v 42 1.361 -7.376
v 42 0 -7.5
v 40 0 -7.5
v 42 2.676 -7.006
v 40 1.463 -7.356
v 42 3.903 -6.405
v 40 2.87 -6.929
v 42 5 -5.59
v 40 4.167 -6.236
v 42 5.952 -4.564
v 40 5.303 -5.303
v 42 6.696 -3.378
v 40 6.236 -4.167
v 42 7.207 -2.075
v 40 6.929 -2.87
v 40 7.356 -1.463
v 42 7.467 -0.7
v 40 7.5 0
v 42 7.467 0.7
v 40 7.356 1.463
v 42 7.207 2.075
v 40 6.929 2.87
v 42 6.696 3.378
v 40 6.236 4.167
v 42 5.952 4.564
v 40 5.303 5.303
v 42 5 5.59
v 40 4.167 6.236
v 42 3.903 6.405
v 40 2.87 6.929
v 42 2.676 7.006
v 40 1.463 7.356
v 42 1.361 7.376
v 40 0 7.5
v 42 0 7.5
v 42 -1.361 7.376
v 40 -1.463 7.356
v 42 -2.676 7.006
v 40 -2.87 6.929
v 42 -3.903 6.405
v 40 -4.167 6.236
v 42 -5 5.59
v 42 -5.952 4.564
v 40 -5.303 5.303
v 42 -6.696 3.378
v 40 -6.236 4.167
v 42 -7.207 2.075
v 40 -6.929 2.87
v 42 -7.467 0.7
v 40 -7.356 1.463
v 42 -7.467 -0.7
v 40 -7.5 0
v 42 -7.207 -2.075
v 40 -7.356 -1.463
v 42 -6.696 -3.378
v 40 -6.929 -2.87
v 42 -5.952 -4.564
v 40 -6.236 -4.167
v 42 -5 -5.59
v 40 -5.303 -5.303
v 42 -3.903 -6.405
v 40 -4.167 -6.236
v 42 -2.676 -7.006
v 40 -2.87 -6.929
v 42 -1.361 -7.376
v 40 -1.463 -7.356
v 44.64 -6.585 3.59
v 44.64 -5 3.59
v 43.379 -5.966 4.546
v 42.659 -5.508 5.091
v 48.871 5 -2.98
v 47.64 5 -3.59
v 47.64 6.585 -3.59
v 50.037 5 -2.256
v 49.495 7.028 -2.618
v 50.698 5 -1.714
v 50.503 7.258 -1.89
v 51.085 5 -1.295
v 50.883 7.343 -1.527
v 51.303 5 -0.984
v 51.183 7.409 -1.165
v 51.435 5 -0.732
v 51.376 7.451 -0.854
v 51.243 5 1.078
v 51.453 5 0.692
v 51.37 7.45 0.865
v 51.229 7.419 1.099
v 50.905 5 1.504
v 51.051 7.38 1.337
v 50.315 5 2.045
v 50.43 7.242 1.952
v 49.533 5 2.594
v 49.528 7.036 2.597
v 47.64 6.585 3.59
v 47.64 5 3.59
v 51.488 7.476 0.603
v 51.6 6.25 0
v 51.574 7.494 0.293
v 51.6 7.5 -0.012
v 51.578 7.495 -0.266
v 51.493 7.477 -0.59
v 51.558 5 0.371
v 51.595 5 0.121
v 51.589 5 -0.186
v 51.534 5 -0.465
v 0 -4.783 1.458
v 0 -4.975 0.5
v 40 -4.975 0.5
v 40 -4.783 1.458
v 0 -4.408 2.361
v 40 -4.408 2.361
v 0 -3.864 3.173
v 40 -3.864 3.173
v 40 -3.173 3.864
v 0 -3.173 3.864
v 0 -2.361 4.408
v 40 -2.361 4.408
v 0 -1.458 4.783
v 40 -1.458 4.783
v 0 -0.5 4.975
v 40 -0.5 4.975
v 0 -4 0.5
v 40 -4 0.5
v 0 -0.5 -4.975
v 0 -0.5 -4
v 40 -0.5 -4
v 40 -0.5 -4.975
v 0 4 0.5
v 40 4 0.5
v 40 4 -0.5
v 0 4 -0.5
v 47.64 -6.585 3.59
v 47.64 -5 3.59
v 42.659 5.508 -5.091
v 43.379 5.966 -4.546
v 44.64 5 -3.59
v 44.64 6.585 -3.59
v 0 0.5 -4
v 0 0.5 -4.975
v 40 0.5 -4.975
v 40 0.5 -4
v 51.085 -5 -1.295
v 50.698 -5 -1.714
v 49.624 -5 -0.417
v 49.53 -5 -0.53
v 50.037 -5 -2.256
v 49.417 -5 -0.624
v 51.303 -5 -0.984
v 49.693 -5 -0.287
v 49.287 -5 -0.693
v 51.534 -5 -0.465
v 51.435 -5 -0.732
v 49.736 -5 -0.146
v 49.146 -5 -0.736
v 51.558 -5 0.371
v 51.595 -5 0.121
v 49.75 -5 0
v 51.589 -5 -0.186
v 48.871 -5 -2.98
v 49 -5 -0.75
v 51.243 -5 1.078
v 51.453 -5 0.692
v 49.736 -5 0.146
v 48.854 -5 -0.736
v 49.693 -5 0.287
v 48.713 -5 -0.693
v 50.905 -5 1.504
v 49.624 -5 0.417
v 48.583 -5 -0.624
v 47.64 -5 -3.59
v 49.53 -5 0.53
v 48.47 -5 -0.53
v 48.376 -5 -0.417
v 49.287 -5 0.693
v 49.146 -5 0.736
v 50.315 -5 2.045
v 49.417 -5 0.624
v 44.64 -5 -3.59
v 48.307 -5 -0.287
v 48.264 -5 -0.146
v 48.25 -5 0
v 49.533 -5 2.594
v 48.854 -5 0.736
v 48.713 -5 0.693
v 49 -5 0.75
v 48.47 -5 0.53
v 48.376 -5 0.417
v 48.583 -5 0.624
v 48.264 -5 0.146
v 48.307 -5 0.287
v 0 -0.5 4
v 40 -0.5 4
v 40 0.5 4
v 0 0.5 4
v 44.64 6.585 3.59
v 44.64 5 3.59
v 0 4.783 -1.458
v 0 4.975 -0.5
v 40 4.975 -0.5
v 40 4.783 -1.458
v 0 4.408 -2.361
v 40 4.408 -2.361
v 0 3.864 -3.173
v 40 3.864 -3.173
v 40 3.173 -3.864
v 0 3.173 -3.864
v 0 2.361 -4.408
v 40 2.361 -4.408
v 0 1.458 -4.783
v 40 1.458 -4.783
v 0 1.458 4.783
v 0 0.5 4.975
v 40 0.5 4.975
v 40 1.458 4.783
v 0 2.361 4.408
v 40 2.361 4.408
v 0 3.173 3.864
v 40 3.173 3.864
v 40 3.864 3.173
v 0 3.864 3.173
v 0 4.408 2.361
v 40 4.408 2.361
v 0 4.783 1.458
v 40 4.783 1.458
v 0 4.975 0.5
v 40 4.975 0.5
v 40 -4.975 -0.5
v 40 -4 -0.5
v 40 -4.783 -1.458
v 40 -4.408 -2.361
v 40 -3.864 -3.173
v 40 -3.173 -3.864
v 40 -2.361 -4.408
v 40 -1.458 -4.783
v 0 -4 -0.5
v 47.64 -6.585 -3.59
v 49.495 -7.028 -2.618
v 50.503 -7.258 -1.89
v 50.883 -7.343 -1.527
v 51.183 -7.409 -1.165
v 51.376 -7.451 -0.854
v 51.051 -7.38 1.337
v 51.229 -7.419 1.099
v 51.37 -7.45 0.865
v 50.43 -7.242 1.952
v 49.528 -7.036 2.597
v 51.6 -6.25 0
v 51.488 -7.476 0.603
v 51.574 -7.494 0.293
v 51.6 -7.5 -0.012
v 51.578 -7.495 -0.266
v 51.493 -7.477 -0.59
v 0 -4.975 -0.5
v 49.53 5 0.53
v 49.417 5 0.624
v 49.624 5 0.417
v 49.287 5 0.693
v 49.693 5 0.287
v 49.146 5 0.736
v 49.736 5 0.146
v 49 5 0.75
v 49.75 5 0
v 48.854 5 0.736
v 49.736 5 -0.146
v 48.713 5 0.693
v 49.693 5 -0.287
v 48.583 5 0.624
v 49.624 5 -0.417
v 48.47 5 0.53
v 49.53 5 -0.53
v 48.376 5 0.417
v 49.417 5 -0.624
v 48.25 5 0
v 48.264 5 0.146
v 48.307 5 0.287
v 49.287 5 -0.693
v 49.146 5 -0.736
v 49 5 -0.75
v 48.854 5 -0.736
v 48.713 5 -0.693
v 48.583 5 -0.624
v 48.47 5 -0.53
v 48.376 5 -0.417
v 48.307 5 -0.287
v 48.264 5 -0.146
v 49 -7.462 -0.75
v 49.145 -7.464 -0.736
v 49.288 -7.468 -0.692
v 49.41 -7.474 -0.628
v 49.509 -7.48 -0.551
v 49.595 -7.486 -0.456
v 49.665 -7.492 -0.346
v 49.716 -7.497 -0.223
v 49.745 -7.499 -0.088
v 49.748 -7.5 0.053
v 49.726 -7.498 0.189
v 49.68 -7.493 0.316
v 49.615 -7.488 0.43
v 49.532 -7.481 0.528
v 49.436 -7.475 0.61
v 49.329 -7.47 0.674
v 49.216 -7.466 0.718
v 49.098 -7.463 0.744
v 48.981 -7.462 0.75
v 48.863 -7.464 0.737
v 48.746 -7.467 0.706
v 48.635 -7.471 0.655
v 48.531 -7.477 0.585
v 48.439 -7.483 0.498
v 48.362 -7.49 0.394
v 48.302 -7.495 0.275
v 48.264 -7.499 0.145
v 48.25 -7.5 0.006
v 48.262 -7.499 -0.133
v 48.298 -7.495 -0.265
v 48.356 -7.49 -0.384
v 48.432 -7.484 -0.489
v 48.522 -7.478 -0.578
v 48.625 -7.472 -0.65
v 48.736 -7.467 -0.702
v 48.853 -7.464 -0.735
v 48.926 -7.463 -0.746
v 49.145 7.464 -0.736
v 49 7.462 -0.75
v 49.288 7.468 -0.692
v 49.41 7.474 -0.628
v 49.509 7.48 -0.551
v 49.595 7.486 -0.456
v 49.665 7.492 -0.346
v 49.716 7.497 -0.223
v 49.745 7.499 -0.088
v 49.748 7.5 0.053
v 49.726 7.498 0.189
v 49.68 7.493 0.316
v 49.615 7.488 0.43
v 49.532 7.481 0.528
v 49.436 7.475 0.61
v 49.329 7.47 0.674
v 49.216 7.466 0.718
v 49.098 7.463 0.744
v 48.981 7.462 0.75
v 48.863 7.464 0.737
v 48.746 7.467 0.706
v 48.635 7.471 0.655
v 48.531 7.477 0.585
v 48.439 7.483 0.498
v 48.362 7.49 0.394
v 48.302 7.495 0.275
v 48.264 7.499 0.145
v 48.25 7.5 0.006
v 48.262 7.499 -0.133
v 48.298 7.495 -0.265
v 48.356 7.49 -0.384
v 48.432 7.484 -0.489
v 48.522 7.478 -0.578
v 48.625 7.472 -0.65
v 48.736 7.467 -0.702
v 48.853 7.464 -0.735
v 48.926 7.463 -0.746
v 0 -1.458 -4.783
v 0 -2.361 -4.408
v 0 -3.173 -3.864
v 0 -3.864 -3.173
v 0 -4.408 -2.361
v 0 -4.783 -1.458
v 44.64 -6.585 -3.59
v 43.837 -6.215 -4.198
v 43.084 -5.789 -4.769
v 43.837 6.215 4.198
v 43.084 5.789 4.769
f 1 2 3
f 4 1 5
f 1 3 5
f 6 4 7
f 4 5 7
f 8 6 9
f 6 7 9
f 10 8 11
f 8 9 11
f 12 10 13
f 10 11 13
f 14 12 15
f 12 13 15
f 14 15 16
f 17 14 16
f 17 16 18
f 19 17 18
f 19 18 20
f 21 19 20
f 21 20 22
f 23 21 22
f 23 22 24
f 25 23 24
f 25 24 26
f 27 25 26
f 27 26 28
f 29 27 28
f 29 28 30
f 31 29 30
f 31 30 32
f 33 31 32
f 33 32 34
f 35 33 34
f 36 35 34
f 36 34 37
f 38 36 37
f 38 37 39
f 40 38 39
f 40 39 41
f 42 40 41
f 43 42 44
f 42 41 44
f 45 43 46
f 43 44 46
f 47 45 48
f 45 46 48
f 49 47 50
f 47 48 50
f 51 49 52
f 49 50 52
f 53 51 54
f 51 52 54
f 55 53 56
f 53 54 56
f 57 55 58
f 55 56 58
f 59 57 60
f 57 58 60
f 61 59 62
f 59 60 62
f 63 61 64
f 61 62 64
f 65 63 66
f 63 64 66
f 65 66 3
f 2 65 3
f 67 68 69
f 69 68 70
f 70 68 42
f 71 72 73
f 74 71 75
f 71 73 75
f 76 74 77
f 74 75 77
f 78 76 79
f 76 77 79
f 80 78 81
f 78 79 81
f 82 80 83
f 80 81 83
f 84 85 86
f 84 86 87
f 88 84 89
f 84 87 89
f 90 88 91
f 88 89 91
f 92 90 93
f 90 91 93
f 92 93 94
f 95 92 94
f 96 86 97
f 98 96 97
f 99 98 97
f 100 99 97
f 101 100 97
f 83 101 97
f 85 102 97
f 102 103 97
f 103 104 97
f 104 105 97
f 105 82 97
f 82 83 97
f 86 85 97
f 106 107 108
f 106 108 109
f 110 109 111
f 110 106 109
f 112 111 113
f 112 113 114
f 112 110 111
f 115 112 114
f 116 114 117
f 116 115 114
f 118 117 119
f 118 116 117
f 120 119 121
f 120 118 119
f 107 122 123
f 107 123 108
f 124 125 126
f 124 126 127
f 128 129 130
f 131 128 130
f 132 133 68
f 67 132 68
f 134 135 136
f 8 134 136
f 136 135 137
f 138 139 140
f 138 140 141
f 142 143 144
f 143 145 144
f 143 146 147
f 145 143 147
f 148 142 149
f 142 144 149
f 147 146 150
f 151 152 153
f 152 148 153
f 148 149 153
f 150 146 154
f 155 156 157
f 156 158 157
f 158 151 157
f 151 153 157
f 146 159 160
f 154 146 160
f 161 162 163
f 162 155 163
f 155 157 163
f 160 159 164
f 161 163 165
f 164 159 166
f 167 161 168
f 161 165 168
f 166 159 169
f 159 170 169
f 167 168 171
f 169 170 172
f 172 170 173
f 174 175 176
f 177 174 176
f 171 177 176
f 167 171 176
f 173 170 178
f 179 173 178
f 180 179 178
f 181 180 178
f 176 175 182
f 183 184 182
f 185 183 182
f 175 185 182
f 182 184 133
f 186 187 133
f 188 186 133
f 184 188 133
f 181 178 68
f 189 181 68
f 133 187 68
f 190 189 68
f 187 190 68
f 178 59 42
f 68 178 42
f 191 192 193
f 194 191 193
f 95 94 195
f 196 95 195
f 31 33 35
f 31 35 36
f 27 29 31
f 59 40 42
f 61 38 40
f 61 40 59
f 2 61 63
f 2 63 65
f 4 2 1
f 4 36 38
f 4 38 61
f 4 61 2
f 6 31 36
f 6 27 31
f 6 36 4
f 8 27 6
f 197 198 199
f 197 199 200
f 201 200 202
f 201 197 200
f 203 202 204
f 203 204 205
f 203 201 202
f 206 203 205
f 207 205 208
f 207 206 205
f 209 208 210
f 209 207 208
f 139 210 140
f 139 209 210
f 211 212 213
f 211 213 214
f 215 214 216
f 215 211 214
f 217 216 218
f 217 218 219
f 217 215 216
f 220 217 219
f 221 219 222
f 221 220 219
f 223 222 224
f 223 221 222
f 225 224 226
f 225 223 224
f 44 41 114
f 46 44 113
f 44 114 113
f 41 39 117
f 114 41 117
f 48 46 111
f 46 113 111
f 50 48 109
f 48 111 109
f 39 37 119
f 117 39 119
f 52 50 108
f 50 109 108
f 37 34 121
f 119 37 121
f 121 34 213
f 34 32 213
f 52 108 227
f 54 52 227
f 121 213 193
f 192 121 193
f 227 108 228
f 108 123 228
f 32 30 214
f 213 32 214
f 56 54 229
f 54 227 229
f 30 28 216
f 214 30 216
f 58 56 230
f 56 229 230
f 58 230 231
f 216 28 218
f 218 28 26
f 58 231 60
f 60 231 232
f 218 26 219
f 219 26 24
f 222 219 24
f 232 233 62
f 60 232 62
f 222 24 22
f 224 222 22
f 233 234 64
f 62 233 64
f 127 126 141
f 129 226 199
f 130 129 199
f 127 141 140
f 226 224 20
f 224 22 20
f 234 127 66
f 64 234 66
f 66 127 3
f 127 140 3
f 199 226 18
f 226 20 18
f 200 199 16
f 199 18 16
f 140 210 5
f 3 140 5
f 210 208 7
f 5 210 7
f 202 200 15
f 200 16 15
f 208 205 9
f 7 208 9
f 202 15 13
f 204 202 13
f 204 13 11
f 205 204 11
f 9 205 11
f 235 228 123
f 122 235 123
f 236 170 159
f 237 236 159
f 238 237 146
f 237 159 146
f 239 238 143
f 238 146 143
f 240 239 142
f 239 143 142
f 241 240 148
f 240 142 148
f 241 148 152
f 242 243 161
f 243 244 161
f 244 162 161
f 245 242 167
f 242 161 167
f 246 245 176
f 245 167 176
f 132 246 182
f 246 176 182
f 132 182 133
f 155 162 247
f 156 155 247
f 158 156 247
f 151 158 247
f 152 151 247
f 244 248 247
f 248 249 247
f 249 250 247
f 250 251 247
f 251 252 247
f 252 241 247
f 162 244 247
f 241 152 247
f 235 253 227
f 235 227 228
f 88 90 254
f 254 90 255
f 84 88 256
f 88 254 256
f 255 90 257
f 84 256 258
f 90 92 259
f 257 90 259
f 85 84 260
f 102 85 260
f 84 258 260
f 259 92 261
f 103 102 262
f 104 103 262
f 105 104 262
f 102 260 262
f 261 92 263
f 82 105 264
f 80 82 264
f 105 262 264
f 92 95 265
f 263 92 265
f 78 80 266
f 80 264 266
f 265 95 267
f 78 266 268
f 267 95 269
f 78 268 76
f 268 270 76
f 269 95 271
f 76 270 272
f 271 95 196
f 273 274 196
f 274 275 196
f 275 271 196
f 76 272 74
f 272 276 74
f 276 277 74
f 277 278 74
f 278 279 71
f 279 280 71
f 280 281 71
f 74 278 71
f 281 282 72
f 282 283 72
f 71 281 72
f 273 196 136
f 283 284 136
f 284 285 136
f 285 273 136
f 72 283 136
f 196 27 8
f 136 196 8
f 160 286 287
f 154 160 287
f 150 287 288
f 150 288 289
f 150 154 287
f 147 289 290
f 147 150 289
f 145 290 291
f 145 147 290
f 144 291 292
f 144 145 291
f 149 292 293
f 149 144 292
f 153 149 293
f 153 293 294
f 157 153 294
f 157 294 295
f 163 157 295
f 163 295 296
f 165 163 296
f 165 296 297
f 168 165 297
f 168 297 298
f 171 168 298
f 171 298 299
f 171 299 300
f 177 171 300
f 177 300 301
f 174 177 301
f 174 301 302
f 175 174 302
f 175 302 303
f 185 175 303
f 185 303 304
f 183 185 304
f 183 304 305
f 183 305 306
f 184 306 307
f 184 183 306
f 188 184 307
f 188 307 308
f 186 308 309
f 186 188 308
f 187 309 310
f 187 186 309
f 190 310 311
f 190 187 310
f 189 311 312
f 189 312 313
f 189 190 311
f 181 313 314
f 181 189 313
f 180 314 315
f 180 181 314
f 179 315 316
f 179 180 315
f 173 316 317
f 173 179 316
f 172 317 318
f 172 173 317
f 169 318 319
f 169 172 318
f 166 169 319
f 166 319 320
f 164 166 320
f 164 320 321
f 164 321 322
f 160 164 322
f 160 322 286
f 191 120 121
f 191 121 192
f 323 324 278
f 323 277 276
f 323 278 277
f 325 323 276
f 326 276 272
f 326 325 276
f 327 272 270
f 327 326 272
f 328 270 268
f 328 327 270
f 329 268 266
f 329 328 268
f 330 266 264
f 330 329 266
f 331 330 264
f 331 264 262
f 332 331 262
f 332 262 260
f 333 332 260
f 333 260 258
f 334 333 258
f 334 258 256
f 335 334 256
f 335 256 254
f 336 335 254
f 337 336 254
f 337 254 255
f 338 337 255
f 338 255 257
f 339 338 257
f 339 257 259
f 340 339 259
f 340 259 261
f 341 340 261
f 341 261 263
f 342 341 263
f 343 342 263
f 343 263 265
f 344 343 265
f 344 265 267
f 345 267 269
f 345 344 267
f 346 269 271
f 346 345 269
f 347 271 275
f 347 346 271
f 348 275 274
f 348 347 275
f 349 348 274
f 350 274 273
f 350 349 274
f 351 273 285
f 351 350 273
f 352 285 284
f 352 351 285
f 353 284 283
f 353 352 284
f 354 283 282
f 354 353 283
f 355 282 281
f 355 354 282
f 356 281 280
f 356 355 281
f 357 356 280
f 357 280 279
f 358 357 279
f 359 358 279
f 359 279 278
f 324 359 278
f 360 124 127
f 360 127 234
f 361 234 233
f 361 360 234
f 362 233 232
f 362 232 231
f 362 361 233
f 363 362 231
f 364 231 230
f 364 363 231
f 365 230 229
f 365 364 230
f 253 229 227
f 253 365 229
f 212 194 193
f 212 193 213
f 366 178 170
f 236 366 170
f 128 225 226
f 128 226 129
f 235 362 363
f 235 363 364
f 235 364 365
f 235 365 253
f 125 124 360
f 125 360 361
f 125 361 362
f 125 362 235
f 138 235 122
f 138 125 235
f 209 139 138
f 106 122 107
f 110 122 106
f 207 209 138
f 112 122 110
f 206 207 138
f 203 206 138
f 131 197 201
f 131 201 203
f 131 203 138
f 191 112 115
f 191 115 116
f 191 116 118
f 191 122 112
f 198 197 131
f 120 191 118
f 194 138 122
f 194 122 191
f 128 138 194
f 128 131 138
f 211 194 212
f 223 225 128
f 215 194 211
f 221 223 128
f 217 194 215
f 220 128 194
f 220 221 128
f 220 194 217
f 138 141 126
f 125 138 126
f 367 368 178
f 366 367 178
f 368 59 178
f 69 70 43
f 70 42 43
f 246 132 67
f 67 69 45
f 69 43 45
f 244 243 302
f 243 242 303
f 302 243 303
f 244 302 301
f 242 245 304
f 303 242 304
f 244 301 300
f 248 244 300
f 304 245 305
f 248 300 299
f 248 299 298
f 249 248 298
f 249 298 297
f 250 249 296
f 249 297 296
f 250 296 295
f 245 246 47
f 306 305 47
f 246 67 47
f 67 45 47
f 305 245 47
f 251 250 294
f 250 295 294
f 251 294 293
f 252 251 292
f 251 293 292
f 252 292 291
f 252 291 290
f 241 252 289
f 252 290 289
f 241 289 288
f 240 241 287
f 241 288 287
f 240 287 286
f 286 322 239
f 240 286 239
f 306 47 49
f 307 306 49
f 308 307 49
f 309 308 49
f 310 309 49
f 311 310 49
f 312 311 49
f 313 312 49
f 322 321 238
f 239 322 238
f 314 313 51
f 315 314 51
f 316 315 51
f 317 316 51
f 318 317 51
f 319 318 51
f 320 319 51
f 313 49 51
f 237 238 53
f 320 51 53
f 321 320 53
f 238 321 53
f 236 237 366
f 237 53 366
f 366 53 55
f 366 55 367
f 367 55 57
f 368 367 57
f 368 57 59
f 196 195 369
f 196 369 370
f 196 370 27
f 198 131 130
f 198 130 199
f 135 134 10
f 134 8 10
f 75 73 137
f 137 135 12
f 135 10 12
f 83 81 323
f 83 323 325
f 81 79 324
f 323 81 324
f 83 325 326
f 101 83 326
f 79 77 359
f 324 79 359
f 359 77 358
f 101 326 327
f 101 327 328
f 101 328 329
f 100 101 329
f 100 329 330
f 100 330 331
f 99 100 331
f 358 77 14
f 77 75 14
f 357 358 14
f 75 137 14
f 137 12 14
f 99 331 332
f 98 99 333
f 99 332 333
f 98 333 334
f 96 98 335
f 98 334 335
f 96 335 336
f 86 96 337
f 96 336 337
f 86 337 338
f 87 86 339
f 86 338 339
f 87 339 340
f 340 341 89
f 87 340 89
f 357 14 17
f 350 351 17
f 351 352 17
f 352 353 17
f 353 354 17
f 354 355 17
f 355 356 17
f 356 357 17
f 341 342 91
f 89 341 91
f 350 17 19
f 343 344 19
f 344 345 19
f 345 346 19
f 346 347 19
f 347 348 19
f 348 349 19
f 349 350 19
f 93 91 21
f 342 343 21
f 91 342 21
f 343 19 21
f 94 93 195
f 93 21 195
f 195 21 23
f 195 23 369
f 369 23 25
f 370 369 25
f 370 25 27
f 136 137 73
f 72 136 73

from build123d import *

# Parameters (mm, degrees)
BOSS_EXTRUDE1_DEPTH     = 40
SKETCH2_R               = 7.5
BOSS_EXTRUDE2_DEPTH     = 2
BOSS_EXTRUDE3_DEPTH     = 10
CUT_EXTRUDE1_DEPTH      = 55.004629431
CUT_EXTRUDE1_DEPTH_BACK = 55.004629431
CUT_EXTRUDE2_DEPTH      = 54.619586107
CUT_EXTRUDE2_DEPTH_BACK = 54.619586107
SKETCH5_R               = 0.75


with BuildPart() as part:
    # Sketch1 → Boss-Extrude1 (new body)
    with BuildSketch(Plane(origin=(0, 0, 0), x_dir=(0, 0, -1), z_dir=(1, 0, 0))):
        with BuildLine():
            Line((-0.5, 4), (0.5, 4))
            Line((0.5, 4), (0.5, 4.974937186))
            ThreePointArc((0.5, 4.974937186), (3.535533906, 3.535533906), (4.974937186, 0.5))
            Line((4.974937186, 0.5), (4, 0.5))
            Line((4, 0.5), (4, -0.5))
            Line((4, -0.5), (4.974937186, -0.5))
            ThreePointArc((4.974937186, -0.5), (3.535533906, -3.535533906), (0.5, -4.974937186))
            Line((0.5, -4.974937186), (0.5, -4))
            Line((0.5, -4), (-0.5, -4))
            Line((-0.5, -4), (-0.5, -4.974937186))
            ThreePointArc((-0.5, -4.974937186), (-3.535533906, -3.535533906), (-4.974937186, -0.5))
            Line((-4.974937186, -0.5), (-4, -0.5))
            Line((-4, -0.5), (-4, 0.5))
            Line((-4, 0.5), (-4.974937186, 0.5))
            ThreePointArc((-4.974937186, 0.5), (-3.535533906, 3.535533906), (-0.5, 4.974937186))
            Line((-0.5, 4.974937186), (-0.5, 4))
        make_face()
    extrude(amount=BOSS_EXTRUDE1_DEPTH)

    # Sketch2 → Boss-Extrude2 (add)
    with BuildSketch(Plane(origin=(40, 0, 0), x_dir=(0, 0, -1), z_dir=(1, 0, 0))):
        Circle(SKETCH2_R)
    extrude(amount=BOSS_EXTRUDE2_DEPTH)

    # Sketch3 → Boss-Extrude3 (add)
    with BuildSketch(Plane(origin=(42, 0, 0), x_dir=(0, 0, -1), z_dir=(1, 0, 0))):
        with BuildLine():
            ThreePointArc((5.590169944, 5), (0, 7.5), (-5.590169944, 5))
            Line((-5.590169944, 5), (-4.898979486, 5))
            Line((-4.898979486, 5), (4.898979486, 5))
            Line((4.898979486, 5), (5.590169944, 5))
        make_face()
        with BuildLine():
            Line((-4.898979486, -5), (-5.590169944, -5))
            ThreePointArc((-5.590169944, -5), (0, -7.5), (5.590169944, -5))
            Line((5.590169944, -5), (4.898979486, -5))
            Line((4.898979486, -5), (-4.898979486, -5))
        make_face()
    extrude(amount=BOSS_EXTRUDE3_DEPTH)

    # Sketch4 → Cut-Extrude1 (cut, two sides: drawn at the far end of the back side and taken through both)
    with BuildSketch(Plane.XZ.offset(-5).offset(-CUT_EXTRUDE1_DEPTH_BACK)):
        with BuildLine():
            Line((42, 5.590169944), (52, 5.590169944))
            Line((52, 5.590169944), (52, -5.590169944))
            Line((52, -5.590169944), (42, -5.590169944))
            Line((42, -5.590169944), (44.640400827, -3.590169944))
            Line((44.640400827, -3.590169944), (47.640400827, -3.590169944))
            add(Edge.make_bspline(
                [(47.640400827, -3.590169944), (50.280133609, -2.393446629), (52.919866391, 0), (50.280133609, 2.393446629), (47.640400827, 3.590169944)],
                knots=[0.178885438, 0.178885438, 0.178885438, 0.178885438, 0.5, 0.821114562, 0.821114562, 0.821114562, 0.821114562], degree=3))
            Line((47.640400827, 3.590169944), (44.640400827, 3.590169944))
            Line((44.640400827, 3.590169944), (42, 5.590169944))
        make_face()
    extrude(amount=CUT_EXTRUDE1_DEPTH + CUT_EXTRUDE1_DEPTH_BACK, mode=Mode.SUBTRACT)

    # Sketch5 → Cut-Extrude2 (cut, two sides: drawn at the far end of the back side and taken through both)
    with BuildSketch(Plane.XZ.offset(-5).offset(-CUT_EXTRUDE2_DEPTH_BACK)):
        with Locations(Location((49, 0, 0), (0, 0, 270))):
            Circle(SKETCH5_R)
    extrude(amount=CUT_EXTRUDE2_DEPTH + CUT_EXTRUDE2_DEPTH_BACK, mode=Mode.SUBTRACT)


solid = part.part
